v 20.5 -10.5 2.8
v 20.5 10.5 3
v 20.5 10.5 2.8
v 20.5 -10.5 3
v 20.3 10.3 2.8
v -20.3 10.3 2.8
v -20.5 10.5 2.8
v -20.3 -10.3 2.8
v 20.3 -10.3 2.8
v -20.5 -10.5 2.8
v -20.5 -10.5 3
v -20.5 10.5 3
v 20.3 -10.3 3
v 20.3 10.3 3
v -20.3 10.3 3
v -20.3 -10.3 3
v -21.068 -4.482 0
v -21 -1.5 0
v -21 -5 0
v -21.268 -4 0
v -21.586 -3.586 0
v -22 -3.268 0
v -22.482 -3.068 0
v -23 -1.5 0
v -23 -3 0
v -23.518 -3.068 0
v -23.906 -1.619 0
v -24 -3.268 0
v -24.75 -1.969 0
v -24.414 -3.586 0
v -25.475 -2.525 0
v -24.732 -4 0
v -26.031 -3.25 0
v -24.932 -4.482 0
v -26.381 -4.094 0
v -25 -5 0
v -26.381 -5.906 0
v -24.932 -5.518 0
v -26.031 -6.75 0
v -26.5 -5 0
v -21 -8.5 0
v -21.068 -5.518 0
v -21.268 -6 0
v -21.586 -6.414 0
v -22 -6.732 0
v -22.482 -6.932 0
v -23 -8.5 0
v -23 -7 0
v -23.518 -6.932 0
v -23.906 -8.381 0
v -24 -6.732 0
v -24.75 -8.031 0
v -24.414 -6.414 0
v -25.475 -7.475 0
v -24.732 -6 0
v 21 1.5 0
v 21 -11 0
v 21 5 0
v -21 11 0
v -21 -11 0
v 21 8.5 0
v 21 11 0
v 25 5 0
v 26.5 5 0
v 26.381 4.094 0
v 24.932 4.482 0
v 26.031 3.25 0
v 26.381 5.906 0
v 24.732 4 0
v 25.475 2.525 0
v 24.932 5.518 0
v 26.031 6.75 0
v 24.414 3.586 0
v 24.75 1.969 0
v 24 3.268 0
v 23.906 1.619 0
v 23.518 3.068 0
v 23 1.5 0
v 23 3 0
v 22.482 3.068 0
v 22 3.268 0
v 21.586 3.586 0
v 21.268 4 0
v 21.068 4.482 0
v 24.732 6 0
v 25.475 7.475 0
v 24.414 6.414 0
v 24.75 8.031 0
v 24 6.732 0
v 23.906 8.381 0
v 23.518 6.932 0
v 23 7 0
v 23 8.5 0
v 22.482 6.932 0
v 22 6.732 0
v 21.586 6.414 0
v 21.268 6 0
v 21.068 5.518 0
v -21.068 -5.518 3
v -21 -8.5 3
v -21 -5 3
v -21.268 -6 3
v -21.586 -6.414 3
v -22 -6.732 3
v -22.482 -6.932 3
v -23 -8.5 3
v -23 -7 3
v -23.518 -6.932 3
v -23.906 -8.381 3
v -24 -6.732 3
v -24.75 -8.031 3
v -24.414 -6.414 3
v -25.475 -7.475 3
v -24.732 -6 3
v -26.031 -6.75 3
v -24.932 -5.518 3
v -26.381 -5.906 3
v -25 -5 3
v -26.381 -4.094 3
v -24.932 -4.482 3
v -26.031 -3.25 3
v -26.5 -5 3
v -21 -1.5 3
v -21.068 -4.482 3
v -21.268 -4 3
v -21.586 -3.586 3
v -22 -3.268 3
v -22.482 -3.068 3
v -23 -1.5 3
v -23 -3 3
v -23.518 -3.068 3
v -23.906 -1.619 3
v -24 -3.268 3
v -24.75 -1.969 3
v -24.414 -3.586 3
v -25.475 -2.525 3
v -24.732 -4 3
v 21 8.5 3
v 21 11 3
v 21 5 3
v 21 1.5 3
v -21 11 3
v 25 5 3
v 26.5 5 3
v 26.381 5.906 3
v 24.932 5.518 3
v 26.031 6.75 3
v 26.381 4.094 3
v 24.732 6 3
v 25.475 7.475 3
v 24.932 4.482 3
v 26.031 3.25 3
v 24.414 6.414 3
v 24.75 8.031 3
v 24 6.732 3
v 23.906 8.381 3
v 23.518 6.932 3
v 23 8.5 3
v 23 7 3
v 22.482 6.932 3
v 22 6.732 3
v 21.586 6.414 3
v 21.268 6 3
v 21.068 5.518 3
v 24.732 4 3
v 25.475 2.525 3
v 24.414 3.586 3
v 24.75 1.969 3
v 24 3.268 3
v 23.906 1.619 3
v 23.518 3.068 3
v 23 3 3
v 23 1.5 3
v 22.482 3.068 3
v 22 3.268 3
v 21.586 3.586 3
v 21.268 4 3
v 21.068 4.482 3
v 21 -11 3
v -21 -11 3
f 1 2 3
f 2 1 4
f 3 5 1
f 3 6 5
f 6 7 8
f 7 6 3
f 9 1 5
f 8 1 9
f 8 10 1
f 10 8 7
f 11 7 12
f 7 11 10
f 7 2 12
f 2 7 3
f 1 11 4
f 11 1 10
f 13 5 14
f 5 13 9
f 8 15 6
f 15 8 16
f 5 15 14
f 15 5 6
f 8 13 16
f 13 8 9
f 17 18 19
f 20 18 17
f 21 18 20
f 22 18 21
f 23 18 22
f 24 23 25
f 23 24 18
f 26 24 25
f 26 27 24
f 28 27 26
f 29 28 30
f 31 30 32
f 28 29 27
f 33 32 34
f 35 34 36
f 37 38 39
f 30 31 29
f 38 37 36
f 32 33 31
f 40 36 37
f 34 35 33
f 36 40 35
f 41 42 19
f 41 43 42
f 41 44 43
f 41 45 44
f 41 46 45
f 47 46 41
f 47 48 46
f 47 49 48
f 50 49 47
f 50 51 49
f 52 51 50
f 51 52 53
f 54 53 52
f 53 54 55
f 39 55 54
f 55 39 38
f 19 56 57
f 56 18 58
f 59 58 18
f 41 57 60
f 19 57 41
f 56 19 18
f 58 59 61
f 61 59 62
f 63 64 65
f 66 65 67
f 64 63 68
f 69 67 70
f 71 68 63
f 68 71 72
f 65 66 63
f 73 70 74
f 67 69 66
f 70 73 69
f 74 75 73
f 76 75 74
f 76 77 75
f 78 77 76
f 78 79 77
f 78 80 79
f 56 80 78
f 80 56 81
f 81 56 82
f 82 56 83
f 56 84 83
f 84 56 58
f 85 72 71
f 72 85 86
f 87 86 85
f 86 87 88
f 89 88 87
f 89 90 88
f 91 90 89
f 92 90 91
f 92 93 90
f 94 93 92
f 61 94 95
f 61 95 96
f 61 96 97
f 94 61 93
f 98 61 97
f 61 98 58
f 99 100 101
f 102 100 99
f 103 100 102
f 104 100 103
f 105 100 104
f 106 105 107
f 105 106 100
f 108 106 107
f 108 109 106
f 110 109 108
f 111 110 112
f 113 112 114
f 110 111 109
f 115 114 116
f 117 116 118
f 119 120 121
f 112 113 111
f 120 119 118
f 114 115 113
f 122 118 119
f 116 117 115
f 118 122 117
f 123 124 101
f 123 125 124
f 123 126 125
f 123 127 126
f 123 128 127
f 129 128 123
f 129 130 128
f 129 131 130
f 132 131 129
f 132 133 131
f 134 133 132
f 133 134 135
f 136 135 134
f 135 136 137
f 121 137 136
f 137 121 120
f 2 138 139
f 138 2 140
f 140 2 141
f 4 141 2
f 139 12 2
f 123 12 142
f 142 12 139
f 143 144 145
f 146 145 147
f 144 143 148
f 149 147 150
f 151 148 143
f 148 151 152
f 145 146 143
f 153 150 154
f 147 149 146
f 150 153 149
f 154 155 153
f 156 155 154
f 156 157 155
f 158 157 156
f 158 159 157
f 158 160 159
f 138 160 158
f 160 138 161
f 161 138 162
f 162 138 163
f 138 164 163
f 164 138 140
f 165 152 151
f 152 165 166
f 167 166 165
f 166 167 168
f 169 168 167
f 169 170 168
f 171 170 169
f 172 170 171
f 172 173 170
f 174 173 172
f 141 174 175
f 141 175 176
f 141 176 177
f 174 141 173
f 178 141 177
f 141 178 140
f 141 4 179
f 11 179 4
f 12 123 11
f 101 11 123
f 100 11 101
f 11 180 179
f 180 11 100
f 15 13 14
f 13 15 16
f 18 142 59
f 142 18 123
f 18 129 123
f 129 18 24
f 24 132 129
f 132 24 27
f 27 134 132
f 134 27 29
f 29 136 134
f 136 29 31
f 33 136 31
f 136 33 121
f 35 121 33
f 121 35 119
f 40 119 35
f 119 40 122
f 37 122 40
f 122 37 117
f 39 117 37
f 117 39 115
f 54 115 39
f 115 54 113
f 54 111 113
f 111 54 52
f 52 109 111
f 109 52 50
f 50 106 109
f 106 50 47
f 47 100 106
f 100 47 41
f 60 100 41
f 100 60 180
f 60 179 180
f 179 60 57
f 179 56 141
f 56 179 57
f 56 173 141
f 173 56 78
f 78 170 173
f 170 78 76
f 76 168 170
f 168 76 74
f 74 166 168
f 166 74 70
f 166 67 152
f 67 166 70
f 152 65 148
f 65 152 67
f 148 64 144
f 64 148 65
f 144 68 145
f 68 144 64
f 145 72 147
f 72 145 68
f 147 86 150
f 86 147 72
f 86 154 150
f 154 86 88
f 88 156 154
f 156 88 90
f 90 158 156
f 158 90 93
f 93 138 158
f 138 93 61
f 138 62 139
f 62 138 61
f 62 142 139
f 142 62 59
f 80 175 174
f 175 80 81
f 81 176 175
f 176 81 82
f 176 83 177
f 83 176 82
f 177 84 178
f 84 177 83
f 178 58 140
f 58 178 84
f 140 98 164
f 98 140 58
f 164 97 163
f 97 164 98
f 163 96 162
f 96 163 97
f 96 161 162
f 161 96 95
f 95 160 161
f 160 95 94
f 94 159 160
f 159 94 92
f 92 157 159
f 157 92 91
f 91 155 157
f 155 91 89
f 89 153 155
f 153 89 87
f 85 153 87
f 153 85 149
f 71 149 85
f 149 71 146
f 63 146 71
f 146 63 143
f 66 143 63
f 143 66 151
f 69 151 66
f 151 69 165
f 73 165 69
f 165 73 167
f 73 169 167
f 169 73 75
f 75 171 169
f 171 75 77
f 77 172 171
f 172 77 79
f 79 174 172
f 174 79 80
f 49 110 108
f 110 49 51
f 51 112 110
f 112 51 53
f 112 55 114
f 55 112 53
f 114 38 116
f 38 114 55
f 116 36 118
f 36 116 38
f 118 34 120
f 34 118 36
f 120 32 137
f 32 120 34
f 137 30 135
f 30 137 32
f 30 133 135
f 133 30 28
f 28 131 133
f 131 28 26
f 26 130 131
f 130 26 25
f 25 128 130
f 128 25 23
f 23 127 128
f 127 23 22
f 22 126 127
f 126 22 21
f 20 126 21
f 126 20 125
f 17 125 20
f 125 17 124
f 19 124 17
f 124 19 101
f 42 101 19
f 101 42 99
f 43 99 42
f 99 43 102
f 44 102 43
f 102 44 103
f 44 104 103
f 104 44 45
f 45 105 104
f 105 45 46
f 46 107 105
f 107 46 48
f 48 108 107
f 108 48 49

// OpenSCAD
// file: ../keystone/keystone.scad
module keystoneCutout() {
    linear_extrude(14.8) polygon([
        [0,2.4],
        [1.4,2],
        [1.4,0],    
        [7.6,0],
        [9.5,2],
        [9.5,18.4],
        [4.6,24.6],
        [1.4,24.6],
        [1.4,22.2],
        [0,22.2],
    ]);
}

module keystonePort(border=4.1) {
    translate([4,4,0]) difference() {
        linear_extrude(9.5)
            offset(delta=border, chamfer=true)
                square([14.8,24.6]);
        
        translate([14.8,0,0])
            rotate([0,-90,0])
                keystoneCutout();
    }
}
// file: rearPanelKeystone.scad
include <rearPanelBlank.scad>;
include <../keystone/keystone.scad>

module keyStonePlate(basePlate=[42,22,3], tab=[4,7,2.5]) {
    BasePlateY = basePlate[1];
    difference() {
        union() {
            rearPanelBlank(basePlate,tab);
            translate([-2,0,0])
            linear_extrude(9.5)
                square([30,BasePlateY], center=true);
        }

        translate([24.6/2-2,-14.8/2,9.5])
            rotate([0,90,90])
                keystoneCutout();
    }
}
// file: rearPanelBlank.scad
module rearPanelTab(tab=[4,7]) {
    tabID=tab[0];
    tabOD=tab[1];
    difference() {
        union() {
            difference() {
                circle(d=tabOD, $fn=24);
                translate([tabOD/4,0])
                    square([tabOD/2,tabOD], center=true);
            }
            translate([tabID/4,0])
                square([tabID/2,tabOD], center=true);
        }
        circle(d=tabID, $fn=24);
    }
}

module rearPanelBlankOutline(basePlate=[42,22], tab=[4,7,2.5]) {
    
    BasePlateX=basePlate[0];
    BasePlateY=basePlate[1];
    tabID=tab[0];
    tabOD=tab[1];
    tabYInset=tab[2];
    
    union() {
        square([BasePlateX, BasePlateY], center=true);
        
        translate([BasePlateX/2*-1-tabID/2,BasePlateY/2*-1+tabOD/2+tabYInset])
            rearPanelTab(tab);
        
        translate([BasePlateX/2+tabID/2,BasePlateY/2-tabOD/2-tabYInset])
            rotate([0,0,180])
                rearPanelTab(tab);
    }
}

module rearPanelBlank(basePlate=[42,22,3], tab=[4,7,2.5]) {
    
    BasePlateX=basePlate[0];
    BasePlateY=basePlate[1];
    BasePlateZ=basePlate[2];
    tabID=tab[0];
    tabOD=tab[1];
    tabYInset=tab[2];
    
    difference() {
        linear_extrude(BasePlateZ)
            rearPanelBlankOutline(basePlate, tab);
        
        // Neat little one layer border to help with orientation.
        translate([0,0,BasePlateZ])
            difference() {
                cube([BasePlateX-1, BasePlateY-1,0.4], center=true);
                cube([BasePlateX-1.4, BasePlateY-1.4,0.4], center=true);
            }
    }
}
// main file
include <rearPanelBlank.scad>;
include <rearPanelKeystone.scad>;

Select = 0; // [0:rearPanelBlank, 1:rearPanelKeystone]

if (Select==0) {
    rearPanelBlank();
} else if (Select==1) {
    keyStonePlate();
}
